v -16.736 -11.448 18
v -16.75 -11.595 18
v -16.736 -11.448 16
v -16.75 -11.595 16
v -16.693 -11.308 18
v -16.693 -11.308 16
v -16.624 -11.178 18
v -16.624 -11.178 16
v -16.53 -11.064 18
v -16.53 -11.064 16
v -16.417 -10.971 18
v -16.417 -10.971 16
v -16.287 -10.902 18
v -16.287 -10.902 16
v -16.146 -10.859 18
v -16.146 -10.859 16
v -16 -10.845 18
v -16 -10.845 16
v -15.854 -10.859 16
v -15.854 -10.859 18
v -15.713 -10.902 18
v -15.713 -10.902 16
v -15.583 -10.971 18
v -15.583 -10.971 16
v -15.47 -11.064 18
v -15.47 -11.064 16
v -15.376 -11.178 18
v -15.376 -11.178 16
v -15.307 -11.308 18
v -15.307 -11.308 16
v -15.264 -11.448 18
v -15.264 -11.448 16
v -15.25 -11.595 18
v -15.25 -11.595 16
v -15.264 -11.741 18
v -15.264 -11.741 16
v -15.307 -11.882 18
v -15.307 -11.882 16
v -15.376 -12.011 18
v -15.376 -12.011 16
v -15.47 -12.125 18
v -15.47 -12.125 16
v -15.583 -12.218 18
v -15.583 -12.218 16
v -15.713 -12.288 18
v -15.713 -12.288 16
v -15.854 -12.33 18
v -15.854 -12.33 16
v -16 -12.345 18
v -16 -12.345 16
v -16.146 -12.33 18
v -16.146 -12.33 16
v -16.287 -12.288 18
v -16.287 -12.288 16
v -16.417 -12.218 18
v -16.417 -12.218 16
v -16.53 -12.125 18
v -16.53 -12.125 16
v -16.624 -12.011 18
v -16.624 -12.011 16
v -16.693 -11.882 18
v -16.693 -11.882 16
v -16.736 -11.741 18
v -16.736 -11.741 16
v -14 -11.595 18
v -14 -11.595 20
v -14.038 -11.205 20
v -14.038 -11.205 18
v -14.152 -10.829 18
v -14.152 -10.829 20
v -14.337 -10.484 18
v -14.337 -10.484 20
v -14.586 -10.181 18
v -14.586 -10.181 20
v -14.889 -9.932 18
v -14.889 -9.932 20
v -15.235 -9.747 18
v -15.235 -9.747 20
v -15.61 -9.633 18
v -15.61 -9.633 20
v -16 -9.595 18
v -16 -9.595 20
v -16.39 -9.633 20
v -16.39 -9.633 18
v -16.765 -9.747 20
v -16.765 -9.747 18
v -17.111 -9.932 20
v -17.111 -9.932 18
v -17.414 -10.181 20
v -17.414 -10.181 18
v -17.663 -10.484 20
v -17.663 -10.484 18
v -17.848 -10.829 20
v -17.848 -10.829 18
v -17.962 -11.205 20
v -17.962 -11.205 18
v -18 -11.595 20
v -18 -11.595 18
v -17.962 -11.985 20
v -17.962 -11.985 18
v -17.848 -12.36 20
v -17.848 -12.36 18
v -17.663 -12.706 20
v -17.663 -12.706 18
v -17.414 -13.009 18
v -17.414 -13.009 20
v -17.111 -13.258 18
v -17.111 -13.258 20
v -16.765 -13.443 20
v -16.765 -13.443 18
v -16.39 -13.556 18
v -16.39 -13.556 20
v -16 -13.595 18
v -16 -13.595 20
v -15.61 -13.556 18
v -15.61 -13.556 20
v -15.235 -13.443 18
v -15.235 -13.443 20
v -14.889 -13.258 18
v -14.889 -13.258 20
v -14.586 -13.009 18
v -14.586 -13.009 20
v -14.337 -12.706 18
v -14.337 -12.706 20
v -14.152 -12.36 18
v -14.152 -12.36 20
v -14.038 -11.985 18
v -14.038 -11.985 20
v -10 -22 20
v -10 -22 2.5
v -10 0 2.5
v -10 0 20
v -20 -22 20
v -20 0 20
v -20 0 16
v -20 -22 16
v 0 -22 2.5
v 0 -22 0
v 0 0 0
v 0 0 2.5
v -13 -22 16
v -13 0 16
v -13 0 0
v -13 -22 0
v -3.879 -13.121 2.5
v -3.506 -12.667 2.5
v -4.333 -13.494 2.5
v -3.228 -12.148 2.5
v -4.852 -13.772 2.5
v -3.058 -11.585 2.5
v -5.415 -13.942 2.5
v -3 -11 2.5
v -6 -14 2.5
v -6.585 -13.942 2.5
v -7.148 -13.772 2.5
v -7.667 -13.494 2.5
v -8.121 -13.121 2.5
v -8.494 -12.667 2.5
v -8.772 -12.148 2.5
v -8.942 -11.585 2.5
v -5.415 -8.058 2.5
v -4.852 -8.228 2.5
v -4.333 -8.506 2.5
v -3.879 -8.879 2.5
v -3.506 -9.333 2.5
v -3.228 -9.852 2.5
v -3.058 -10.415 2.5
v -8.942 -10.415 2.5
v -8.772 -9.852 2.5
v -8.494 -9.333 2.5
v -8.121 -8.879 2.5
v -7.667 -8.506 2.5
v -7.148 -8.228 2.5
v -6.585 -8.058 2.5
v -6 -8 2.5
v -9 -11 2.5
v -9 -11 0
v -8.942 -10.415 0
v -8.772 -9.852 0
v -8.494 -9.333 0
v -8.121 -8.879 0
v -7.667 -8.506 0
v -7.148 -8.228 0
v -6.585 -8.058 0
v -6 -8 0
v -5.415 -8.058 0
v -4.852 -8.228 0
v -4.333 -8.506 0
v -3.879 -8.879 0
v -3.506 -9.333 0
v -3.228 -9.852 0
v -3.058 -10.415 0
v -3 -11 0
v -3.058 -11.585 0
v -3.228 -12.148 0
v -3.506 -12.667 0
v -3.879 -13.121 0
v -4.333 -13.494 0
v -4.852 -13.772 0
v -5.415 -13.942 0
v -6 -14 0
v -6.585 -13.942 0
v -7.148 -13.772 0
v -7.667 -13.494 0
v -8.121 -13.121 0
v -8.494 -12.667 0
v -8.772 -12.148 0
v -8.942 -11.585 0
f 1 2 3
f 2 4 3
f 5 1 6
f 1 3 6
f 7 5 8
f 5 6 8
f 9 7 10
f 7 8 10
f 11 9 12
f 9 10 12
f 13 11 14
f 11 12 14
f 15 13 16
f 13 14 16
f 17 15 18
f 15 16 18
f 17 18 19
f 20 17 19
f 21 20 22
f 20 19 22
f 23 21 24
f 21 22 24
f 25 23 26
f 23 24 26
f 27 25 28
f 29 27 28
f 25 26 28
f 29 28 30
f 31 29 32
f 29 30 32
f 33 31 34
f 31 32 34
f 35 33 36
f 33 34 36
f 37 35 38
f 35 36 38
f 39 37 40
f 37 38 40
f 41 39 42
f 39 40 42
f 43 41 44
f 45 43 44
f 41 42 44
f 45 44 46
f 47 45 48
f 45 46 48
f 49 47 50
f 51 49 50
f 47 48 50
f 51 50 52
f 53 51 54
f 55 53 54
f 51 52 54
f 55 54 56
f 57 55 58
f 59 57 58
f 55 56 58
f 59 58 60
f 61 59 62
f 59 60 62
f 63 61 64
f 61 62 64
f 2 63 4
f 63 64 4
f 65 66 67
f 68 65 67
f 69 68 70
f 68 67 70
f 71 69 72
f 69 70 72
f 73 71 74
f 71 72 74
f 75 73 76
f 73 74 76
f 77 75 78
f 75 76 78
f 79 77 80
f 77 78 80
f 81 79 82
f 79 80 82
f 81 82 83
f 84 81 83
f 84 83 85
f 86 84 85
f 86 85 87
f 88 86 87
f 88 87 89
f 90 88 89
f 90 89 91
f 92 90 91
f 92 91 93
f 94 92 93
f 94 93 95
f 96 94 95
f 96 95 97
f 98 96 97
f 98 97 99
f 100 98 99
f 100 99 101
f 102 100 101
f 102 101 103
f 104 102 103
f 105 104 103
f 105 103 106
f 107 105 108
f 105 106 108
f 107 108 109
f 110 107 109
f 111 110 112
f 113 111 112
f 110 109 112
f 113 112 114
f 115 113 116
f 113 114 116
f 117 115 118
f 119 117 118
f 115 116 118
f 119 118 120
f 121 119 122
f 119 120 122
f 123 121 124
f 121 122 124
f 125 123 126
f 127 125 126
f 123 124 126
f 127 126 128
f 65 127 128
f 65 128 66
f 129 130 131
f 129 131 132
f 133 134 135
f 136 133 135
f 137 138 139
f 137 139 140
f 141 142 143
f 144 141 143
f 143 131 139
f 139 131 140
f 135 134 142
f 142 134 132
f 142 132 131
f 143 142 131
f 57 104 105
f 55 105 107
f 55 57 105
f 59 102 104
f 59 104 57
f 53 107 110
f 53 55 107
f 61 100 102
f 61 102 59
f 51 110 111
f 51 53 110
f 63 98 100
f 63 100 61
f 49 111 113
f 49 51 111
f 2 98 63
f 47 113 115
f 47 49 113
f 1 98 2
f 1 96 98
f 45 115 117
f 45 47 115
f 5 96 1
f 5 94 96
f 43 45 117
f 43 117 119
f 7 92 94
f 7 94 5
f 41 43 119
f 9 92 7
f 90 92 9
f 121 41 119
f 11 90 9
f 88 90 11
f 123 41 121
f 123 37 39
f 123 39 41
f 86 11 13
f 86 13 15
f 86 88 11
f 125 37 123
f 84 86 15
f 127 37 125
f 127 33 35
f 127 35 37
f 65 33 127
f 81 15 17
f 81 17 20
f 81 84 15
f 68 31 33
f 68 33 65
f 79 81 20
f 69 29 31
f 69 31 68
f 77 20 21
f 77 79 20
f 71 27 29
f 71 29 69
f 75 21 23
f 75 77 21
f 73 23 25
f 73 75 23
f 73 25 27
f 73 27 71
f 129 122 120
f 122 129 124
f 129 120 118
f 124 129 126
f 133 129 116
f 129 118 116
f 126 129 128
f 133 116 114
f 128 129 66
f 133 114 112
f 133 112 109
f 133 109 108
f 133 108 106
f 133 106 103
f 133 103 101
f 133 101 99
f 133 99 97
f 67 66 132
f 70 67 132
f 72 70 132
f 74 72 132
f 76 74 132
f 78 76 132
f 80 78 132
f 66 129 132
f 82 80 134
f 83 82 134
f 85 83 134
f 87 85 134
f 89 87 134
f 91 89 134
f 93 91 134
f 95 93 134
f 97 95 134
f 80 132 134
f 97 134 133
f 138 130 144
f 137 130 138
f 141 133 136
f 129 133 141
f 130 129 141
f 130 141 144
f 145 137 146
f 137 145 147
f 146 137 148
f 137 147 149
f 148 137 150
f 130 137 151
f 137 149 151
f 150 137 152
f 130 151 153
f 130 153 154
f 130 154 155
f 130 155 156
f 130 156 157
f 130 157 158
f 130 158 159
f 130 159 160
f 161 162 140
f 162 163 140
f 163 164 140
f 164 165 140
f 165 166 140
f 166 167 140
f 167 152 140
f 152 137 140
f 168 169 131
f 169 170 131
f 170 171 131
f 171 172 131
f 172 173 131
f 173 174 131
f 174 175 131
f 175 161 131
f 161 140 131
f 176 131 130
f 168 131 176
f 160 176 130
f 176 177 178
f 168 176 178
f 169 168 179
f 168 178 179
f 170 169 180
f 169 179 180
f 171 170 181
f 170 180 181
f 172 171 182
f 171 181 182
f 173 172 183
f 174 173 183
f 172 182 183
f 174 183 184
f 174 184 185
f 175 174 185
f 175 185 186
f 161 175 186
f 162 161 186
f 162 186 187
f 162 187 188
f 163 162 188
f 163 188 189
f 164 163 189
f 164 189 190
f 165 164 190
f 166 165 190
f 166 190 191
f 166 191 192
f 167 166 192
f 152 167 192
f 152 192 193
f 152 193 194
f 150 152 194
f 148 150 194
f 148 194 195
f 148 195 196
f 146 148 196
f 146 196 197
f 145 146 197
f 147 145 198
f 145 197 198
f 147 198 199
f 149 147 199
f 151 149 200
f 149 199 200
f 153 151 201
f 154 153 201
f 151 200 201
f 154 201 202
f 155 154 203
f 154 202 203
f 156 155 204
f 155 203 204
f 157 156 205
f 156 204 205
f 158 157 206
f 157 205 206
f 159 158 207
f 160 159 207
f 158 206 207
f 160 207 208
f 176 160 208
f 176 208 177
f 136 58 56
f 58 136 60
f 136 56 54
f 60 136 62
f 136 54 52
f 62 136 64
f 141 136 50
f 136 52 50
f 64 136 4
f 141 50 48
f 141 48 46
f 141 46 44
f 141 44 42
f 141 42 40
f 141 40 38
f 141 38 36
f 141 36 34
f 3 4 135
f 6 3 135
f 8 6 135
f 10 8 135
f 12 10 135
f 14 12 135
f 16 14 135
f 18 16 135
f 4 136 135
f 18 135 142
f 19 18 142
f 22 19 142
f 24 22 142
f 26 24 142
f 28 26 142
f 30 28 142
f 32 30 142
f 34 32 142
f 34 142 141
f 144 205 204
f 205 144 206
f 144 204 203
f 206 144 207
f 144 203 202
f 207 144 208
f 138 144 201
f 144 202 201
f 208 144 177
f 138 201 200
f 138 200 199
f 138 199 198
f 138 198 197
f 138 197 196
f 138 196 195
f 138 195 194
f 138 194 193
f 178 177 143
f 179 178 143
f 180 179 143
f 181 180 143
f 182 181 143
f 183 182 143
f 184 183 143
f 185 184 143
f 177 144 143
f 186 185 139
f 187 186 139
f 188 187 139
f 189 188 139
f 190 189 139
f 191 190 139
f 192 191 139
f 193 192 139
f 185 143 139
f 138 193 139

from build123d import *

# Parameters (mm, degrees)
F1_DEPTH       = 22
F3_D           = 6
F5_D           = 1.5
F5_CBORE_D     = 4
F5_CBORE_DEPTH = 2


with BuildPart() as f1:
    # F0 (on Front) → F1 (new body)
    with BuildSketch(Plane.XZ):
        Polygon((-13, 0), (0, 0), (0, 2.5), (-10, 2.5), (-10, 20), (-20, 20), (-20, 16), (-13, 16), align=None)
    extrude(amount=F1_DEPTH)

    # F3 (through all)
    with Locations(Plane.XY.offset(2.5)):
        with Locations((-6, -11)):
            Hole(F3_D / 2)

    # F5 (through all)
    with Locations(Plane.XY.offset(20)):
        with Locations((-16, -11.594802)):
            CounterBoreHole(F5_D / 2, F5_CBORE_D / 2, F5_CBORE_DEPTH)


solid = f1.part
